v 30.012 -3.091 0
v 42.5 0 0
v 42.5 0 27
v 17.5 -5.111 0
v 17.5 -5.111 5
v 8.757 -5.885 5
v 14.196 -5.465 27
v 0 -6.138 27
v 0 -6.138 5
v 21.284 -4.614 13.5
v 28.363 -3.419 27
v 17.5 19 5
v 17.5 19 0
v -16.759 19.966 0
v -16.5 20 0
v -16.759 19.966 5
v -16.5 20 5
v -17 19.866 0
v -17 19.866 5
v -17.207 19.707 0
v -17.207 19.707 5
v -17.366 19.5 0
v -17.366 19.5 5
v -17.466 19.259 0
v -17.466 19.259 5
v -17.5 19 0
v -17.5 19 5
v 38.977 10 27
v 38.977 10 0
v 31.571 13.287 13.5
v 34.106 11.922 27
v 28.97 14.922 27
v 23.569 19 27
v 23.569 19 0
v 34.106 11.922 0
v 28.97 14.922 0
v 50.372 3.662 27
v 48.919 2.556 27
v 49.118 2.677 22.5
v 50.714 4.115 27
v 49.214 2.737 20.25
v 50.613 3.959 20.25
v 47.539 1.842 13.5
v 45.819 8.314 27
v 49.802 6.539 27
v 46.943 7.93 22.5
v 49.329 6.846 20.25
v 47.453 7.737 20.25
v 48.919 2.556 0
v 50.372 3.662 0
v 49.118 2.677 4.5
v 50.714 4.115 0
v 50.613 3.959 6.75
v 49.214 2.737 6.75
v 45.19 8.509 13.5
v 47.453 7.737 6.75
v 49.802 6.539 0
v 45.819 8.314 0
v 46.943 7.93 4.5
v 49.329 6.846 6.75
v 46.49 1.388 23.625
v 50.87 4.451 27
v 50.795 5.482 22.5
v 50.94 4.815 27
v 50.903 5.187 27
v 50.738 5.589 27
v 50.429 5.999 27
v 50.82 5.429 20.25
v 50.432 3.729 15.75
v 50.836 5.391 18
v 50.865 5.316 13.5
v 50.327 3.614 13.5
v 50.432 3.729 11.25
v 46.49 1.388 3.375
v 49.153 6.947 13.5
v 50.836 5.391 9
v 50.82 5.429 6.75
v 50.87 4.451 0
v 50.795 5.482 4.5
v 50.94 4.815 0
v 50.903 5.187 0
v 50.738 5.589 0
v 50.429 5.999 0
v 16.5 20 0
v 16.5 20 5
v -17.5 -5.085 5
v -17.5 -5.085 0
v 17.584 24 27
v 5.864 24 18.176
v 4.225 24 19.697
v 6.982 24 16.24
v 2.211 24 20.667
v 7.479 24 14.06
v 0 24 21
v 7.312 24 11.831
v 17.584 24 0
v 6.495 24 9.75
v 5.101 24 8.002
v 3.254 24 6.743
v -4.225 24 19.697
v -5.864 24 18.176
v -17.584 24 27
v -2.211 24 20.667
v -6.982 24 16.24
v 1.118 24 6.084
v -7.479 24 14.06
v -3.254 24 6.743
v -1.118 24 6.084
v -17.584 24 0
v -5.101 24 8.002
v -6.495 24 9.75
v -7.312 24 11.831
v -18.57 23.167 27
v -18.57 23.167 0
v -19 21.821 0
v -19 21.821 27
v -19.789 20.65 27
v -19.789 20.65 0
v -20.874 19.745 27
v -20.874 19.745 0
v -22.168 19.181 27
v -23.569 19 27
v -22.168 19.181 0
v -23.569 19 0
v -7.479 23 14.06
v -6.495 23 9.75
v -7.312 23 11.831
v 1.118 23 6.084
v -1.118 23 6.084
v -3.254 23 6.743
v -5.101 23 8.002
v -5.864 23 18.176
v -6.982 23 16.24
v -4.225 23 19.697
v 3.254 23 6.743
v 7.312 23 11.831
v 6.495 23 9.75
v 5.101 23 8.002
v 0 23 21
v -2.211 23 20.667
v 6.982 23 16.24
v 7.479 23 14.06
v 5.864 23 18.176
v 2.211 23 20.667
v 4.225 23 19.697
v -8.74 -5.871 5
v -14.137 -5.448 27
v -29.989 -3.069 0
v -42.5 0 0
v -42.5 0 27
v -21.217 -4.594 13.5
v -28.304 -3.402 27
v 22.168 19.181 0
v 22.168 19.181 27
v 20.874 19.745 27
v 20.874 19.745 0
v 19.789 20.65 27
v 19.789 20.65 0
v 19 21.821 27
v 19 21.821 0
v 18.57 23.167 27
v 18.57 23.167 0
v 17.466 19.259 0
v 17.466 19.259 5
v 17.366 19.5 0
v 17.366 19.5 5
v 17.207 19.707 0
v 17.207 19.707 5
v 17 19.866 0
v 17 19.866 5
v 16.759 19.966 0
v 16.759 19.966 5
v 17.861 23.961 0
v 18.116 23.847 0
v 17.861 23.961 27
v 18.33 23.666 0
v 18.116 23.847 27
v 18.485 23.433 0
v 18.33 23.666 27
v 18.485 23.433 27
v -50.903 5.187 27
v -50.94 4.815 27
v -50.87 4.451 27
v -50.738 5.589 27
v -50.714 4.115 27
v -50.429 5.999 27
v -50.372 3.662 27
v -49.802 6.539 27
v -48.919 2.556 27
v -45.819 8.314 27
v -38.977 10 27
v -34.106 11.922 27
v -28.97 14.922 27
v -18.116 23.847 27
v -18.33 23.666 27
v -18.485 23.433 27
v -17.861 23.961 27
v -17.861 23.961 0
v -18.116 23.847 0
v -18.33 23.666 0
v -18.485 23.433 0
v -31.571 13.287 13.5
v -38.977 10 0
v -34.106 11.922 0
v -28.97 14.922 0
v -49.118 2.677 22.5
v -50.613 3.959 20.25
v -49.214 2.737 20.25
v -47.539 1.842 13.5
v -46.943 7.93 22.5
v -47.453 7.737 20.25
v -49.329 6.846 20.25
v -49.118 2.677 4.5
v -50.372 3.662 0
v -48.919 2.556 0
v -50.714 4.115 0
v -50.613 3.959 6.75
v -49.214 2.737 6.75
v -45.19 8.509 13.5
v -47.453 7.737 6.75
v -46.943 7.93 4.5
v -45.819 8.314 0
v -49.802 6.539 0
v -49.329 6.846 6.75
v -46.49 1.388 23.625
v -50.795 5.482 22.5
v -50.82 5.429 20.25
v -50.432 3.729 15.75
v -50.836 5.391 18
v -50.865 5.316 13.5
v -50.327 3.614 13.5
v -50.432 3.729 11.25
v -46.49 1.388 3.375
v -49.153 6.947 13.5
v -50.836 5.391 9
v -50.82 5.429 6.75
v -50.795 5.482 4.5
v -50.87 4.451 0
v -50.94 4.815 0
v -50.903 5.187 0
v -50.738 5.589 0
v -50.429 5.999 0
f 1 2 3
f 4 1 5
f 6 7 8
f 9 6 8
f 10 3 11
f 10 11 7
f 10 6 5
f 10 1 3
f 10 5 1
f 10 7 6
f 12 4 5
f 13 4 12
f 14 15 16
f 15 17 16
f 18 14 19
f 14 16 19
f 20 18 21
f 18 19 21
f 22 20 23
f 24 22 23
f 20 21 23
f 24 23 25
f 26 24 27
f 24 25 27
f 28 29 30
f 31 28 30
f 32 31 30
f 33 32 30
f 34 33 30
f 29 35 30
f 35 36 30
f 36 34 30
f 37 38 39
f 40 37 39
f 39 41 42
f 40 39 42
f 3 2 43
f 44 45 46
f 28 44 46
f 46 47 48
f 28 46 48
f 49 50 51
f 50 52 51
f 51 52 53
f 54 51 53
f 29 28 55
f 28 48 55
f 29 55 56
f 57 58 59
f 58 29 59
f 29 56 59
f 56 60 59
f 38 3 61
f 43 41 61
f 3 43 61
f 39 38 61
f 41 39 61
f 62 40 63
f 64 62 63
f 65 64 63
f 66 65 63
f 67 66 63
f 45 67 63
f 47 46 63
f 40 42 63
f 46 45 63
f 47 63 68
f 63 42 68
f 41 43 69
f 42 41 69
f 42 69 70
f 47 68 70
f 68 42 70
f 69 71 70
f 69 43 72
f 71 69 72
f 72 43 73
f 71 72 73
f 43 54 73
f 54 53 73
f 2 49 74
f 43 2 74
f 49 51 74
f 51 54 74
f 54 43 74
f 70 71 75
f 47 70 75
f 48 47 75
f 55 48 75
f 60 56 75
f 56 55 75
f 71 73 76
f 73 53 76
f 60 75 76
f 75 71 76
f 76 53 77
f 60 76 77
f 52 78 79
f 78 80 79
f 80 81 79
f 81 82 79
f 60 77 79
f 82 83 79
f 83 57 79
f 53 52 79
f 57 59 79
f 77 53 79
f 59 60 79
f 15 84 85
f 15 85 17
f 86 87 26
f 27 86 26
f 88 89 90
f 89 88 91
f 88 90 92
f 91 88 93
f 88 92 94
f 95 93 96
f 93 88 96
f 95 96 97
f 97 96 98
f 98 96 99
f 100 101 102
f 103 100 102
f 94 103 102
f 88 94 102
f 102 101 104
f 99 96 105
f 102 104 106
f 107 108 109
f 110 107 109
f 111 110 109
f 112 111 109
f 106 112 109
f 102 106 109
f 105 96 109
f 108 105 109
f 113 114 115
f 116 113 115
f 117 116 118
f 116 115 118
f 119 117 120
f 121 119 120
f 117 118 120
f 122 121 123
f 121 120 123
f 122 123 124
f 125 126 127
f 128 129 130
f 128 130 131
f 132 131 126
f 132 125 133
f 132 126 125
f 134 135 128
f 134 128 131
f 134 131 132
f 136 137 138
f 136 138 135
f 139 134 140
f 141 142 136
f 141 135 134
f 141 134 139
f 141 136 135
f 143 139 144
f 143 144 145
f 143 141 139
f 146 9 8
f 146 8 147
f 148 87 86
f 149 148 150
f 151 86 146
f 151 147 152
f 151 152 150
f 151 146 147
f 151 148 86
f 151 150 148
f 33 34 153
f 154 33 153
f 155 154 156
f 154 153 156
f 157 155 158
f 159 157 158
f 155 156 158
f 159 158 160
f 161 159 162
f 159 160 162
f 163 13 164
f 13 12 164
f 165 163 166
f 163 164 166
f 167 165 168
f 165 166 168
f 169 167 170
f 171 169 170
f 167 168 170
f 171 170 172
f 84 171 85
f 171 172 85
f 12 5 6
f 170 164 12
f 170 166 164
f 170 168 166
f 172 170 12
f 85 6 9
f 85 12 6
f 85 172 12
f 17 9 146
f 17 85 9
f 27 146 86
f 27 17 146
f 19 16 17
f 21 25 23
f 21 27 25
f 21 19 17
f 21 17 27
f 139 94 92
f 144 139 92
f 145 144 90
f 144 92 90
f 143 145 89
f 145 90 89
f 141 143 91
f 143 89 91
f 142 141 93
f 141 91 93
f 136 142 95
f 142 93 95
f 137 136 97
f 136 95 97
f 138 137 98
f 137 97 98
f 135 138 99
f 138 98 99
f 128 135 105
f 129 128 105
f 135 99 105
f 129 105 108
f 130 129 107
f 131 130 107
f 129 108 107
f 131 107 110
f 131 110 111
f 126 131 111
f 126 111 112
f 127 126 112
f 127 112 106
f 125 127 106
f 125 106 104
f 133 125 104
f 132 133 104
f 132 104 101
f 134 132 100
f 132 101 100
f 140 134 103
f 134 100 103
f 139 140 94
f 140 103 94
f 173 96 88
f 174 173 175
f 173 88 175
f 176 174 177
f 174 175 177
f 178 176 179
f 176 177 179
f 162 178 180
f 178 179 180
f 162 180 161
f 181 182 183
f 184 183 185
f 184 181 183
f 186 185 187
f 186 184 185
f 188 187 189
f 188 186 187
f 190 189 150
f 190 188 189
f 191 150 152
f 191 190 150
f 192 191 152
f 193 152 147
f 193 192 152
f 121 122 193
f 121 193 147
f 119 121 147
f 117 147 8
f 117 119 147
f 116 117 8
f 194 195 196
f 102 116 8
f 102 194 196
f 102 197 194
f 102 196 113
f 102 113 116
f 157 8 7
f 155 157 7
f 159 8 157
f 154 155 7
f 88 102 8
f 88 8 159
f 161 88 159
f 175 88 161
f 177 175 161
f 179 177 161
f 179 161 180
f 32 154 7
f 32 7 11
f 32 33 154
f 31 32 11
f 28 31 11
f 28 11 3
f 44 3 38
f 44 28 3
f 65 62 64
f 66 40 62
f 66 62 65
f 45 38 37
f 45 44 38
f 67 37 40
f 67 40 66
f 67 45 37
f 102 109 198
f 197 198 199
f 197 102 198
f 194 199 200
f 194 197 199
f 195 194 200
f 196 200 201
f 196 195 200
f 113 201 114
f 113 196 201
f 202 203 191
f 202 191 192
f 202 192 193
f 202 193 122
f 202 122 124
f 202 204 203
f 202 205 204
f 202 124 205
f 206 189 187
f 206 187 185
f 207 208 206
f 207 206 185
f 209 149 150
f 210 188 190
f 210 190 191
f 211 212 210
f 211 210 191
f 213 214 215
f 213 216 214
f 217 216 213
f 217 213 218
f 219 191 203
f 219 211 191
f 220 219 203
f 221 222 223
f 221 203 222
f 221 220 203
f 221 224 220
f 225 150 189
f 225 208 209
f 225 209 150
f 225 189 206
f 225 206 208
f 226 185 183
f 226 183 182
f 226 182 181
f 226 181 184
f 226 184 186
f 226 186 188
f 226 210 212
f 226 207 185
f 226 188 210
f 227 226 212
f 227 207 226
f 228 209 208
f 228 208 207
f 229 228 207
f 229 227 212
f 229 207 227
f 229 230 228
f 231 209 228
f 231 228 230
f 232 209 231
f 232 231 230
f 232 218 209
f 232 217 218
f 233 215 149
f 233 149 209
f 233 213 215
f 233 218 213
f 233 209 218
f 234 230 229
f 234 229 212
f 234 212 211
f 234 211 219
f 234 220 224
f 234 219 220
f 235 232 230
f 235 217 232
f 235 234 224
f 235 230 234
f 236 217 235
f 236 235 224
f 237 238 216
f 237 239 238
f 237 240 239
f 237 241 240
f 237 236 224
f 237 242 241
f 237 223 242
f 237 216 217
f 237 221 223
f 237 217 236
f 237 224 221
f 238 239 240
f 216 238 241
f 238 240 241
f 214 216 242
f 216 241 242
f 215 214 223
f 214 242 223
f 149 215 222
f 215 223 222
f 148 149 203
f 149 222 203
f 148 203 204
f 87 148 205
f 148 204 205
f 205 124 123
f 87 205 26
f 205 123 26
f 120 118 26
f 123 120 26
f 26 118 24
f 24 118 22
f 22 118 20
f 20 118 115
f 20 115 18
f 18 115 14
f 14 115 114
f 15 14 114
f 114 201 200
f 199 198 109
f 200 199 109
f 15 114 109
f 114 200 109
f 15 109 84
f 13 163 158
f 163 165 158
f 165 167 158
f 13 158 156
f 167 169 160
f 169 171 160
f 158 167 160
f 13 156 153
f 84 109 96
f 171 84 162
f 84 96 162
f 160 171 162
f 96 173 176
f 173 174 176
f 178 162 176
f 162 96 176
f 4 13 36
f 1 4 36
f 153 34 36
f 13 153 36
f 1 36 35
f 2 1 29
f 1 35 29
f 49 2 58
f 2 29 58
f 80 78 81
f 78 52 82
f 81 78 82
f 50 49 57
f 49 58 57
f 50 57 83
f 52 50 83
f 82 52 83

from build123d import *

# Parameters (mm, degrees)
BOSS_EXTRUDE2_DEPTH = 27
BOSS_EXTRUDE3_DEPTH = 27
SKETCH2_W           = 35
SKETCH2_H           = 30
CUT_EXTRUDE1_DEPTH  = 5
FILLET1_R           = 1
SKETCH3_R           = 7.5
CUT_EXTRUDE2_DEPTH  = 1
FILLET2_R           = 1
FILLET3_R           = 1


with BuildPart() as part:
    # Sketch1 → Boss-Extrude2 (new body)
    with BuildSketch(Plane.XY):
        with BuildLine():
            Line((0, -6.138464618), (0, 24))
            Line((0, 24), (-18.5, 24))
            ThreePointArc((-18.5, 24), (-19.98907726, 20.440025069), (-23.569368605, 19.000481223))
            add(Edge.make_bspline(
                [(-38.977266034, 10), (-31.868069792, 12.073515571), (-23.569368605, 19.000481223)],
                knots=[0, 0, 0, 1, 1, 1], degree=2))
            add(Edge.make_bspline(
                [(-42.5, 0), (-60.990919768, 5.63165305), (-38.977266034, 10)],
                knots=[0, 0, 0, 1, 1, 1], degree=2))
            add(Edge.make_bspline(
                [(0, -6.138464618), (-21.18379083, -6.119278693), (-42.5, 0)],
                knots=[0.501567662, 0.501567662, 0.501567662, 1, 1, 1], degree=2))
        make_face()
    extrude(amount=BOSS_EXTRUDE2_DEPTH)

    # Sketch1<4> → Boss-Extrude3 (add)
    with BuildSketch(Plane.XY):
        with BuildLine():
            Line((18.5, 24), (0, 24))
            Line((0, 24), (0, -6.138464618))
            add(Edge.make_bspline(
                [(42.5, 0), (21.317044751, -6.157771231), (0, -6.138464618)],
                knots=[0, 0, 0, 0.501567662, 0.501567662, 0.501567662], degree=2))
            add(Edge.make_bspline(
                [(42.5, 0), (60.990919768, 5.63165305), (38.977266034, 10)],
                knots=[0, 0, 0, 1, 1, 1], degree=2))
            add(Edge.make_bspline(
                [(38.977266034, 10), (31.868069792, 12.073515571), (23.569368605, 19.000481223)],
                knots=[0, 0, 0, 1, 1, 1], degree=2))
            ThreePointArc((23.569368605, 19.000481223), (19.98907726, 20.440025069), (18.5, 24))
        make_face()
    extrude(amount=BOSS_EXTRUDE3_DEPTH)

    # Sketch2 → Cut-Extrude1 (cut)
    with BuildSketch(Plane(origin=(0, 0, 0), x_dir=(-1, 0, 0), z_dir=(0, 0, -1))):
        with Locations((0, 5)):
            Rectangle(SKETCH2_W, SKETCH2_H)
    extrude(amount=-CUT_EXTRUDE1_DEPTH, mode=Mode.SUBTRACT)

    # Fillet1
    fillet1_edges = [part.edges().sort_by_distance(p)[0] for p in [
        (-17.5, 20, 2.5),
        (17.5, 20, 2.5),
    ]]
    fillet(fillet1_edges, radius=FILLET1_R)

    # Sketch3 → Cut-Extrude2 (cut)
    with BuildSketch(Plane(origin=(0, 24, 0), x_dir=(1, 0, 0), z_dir=(0, 1, 0))):
        with Locations((0, -13.5)):
            Circle(SKETCH3_R)
    extrude(amount=-CUT_EXTRUDE2_DEPTH, mode=Mode.SUBTRACT)

    # Fillet2
    fillet2_edges = [part.edges().sort_by_distance(p)[0] for p in [
        (-18.5, 24, 13.5),
    ]]
    fillet(fillet2_edges, radius=FILLET2_R)

    # Fillet3
    fillet3_edges = [part.edges().sort_by_distance(p)[0] for p in [
        (18.5, 24, 13.5),
    ]]
    fillet(fillet3_edges, radius=FILLET3_R)


solid = part.part
